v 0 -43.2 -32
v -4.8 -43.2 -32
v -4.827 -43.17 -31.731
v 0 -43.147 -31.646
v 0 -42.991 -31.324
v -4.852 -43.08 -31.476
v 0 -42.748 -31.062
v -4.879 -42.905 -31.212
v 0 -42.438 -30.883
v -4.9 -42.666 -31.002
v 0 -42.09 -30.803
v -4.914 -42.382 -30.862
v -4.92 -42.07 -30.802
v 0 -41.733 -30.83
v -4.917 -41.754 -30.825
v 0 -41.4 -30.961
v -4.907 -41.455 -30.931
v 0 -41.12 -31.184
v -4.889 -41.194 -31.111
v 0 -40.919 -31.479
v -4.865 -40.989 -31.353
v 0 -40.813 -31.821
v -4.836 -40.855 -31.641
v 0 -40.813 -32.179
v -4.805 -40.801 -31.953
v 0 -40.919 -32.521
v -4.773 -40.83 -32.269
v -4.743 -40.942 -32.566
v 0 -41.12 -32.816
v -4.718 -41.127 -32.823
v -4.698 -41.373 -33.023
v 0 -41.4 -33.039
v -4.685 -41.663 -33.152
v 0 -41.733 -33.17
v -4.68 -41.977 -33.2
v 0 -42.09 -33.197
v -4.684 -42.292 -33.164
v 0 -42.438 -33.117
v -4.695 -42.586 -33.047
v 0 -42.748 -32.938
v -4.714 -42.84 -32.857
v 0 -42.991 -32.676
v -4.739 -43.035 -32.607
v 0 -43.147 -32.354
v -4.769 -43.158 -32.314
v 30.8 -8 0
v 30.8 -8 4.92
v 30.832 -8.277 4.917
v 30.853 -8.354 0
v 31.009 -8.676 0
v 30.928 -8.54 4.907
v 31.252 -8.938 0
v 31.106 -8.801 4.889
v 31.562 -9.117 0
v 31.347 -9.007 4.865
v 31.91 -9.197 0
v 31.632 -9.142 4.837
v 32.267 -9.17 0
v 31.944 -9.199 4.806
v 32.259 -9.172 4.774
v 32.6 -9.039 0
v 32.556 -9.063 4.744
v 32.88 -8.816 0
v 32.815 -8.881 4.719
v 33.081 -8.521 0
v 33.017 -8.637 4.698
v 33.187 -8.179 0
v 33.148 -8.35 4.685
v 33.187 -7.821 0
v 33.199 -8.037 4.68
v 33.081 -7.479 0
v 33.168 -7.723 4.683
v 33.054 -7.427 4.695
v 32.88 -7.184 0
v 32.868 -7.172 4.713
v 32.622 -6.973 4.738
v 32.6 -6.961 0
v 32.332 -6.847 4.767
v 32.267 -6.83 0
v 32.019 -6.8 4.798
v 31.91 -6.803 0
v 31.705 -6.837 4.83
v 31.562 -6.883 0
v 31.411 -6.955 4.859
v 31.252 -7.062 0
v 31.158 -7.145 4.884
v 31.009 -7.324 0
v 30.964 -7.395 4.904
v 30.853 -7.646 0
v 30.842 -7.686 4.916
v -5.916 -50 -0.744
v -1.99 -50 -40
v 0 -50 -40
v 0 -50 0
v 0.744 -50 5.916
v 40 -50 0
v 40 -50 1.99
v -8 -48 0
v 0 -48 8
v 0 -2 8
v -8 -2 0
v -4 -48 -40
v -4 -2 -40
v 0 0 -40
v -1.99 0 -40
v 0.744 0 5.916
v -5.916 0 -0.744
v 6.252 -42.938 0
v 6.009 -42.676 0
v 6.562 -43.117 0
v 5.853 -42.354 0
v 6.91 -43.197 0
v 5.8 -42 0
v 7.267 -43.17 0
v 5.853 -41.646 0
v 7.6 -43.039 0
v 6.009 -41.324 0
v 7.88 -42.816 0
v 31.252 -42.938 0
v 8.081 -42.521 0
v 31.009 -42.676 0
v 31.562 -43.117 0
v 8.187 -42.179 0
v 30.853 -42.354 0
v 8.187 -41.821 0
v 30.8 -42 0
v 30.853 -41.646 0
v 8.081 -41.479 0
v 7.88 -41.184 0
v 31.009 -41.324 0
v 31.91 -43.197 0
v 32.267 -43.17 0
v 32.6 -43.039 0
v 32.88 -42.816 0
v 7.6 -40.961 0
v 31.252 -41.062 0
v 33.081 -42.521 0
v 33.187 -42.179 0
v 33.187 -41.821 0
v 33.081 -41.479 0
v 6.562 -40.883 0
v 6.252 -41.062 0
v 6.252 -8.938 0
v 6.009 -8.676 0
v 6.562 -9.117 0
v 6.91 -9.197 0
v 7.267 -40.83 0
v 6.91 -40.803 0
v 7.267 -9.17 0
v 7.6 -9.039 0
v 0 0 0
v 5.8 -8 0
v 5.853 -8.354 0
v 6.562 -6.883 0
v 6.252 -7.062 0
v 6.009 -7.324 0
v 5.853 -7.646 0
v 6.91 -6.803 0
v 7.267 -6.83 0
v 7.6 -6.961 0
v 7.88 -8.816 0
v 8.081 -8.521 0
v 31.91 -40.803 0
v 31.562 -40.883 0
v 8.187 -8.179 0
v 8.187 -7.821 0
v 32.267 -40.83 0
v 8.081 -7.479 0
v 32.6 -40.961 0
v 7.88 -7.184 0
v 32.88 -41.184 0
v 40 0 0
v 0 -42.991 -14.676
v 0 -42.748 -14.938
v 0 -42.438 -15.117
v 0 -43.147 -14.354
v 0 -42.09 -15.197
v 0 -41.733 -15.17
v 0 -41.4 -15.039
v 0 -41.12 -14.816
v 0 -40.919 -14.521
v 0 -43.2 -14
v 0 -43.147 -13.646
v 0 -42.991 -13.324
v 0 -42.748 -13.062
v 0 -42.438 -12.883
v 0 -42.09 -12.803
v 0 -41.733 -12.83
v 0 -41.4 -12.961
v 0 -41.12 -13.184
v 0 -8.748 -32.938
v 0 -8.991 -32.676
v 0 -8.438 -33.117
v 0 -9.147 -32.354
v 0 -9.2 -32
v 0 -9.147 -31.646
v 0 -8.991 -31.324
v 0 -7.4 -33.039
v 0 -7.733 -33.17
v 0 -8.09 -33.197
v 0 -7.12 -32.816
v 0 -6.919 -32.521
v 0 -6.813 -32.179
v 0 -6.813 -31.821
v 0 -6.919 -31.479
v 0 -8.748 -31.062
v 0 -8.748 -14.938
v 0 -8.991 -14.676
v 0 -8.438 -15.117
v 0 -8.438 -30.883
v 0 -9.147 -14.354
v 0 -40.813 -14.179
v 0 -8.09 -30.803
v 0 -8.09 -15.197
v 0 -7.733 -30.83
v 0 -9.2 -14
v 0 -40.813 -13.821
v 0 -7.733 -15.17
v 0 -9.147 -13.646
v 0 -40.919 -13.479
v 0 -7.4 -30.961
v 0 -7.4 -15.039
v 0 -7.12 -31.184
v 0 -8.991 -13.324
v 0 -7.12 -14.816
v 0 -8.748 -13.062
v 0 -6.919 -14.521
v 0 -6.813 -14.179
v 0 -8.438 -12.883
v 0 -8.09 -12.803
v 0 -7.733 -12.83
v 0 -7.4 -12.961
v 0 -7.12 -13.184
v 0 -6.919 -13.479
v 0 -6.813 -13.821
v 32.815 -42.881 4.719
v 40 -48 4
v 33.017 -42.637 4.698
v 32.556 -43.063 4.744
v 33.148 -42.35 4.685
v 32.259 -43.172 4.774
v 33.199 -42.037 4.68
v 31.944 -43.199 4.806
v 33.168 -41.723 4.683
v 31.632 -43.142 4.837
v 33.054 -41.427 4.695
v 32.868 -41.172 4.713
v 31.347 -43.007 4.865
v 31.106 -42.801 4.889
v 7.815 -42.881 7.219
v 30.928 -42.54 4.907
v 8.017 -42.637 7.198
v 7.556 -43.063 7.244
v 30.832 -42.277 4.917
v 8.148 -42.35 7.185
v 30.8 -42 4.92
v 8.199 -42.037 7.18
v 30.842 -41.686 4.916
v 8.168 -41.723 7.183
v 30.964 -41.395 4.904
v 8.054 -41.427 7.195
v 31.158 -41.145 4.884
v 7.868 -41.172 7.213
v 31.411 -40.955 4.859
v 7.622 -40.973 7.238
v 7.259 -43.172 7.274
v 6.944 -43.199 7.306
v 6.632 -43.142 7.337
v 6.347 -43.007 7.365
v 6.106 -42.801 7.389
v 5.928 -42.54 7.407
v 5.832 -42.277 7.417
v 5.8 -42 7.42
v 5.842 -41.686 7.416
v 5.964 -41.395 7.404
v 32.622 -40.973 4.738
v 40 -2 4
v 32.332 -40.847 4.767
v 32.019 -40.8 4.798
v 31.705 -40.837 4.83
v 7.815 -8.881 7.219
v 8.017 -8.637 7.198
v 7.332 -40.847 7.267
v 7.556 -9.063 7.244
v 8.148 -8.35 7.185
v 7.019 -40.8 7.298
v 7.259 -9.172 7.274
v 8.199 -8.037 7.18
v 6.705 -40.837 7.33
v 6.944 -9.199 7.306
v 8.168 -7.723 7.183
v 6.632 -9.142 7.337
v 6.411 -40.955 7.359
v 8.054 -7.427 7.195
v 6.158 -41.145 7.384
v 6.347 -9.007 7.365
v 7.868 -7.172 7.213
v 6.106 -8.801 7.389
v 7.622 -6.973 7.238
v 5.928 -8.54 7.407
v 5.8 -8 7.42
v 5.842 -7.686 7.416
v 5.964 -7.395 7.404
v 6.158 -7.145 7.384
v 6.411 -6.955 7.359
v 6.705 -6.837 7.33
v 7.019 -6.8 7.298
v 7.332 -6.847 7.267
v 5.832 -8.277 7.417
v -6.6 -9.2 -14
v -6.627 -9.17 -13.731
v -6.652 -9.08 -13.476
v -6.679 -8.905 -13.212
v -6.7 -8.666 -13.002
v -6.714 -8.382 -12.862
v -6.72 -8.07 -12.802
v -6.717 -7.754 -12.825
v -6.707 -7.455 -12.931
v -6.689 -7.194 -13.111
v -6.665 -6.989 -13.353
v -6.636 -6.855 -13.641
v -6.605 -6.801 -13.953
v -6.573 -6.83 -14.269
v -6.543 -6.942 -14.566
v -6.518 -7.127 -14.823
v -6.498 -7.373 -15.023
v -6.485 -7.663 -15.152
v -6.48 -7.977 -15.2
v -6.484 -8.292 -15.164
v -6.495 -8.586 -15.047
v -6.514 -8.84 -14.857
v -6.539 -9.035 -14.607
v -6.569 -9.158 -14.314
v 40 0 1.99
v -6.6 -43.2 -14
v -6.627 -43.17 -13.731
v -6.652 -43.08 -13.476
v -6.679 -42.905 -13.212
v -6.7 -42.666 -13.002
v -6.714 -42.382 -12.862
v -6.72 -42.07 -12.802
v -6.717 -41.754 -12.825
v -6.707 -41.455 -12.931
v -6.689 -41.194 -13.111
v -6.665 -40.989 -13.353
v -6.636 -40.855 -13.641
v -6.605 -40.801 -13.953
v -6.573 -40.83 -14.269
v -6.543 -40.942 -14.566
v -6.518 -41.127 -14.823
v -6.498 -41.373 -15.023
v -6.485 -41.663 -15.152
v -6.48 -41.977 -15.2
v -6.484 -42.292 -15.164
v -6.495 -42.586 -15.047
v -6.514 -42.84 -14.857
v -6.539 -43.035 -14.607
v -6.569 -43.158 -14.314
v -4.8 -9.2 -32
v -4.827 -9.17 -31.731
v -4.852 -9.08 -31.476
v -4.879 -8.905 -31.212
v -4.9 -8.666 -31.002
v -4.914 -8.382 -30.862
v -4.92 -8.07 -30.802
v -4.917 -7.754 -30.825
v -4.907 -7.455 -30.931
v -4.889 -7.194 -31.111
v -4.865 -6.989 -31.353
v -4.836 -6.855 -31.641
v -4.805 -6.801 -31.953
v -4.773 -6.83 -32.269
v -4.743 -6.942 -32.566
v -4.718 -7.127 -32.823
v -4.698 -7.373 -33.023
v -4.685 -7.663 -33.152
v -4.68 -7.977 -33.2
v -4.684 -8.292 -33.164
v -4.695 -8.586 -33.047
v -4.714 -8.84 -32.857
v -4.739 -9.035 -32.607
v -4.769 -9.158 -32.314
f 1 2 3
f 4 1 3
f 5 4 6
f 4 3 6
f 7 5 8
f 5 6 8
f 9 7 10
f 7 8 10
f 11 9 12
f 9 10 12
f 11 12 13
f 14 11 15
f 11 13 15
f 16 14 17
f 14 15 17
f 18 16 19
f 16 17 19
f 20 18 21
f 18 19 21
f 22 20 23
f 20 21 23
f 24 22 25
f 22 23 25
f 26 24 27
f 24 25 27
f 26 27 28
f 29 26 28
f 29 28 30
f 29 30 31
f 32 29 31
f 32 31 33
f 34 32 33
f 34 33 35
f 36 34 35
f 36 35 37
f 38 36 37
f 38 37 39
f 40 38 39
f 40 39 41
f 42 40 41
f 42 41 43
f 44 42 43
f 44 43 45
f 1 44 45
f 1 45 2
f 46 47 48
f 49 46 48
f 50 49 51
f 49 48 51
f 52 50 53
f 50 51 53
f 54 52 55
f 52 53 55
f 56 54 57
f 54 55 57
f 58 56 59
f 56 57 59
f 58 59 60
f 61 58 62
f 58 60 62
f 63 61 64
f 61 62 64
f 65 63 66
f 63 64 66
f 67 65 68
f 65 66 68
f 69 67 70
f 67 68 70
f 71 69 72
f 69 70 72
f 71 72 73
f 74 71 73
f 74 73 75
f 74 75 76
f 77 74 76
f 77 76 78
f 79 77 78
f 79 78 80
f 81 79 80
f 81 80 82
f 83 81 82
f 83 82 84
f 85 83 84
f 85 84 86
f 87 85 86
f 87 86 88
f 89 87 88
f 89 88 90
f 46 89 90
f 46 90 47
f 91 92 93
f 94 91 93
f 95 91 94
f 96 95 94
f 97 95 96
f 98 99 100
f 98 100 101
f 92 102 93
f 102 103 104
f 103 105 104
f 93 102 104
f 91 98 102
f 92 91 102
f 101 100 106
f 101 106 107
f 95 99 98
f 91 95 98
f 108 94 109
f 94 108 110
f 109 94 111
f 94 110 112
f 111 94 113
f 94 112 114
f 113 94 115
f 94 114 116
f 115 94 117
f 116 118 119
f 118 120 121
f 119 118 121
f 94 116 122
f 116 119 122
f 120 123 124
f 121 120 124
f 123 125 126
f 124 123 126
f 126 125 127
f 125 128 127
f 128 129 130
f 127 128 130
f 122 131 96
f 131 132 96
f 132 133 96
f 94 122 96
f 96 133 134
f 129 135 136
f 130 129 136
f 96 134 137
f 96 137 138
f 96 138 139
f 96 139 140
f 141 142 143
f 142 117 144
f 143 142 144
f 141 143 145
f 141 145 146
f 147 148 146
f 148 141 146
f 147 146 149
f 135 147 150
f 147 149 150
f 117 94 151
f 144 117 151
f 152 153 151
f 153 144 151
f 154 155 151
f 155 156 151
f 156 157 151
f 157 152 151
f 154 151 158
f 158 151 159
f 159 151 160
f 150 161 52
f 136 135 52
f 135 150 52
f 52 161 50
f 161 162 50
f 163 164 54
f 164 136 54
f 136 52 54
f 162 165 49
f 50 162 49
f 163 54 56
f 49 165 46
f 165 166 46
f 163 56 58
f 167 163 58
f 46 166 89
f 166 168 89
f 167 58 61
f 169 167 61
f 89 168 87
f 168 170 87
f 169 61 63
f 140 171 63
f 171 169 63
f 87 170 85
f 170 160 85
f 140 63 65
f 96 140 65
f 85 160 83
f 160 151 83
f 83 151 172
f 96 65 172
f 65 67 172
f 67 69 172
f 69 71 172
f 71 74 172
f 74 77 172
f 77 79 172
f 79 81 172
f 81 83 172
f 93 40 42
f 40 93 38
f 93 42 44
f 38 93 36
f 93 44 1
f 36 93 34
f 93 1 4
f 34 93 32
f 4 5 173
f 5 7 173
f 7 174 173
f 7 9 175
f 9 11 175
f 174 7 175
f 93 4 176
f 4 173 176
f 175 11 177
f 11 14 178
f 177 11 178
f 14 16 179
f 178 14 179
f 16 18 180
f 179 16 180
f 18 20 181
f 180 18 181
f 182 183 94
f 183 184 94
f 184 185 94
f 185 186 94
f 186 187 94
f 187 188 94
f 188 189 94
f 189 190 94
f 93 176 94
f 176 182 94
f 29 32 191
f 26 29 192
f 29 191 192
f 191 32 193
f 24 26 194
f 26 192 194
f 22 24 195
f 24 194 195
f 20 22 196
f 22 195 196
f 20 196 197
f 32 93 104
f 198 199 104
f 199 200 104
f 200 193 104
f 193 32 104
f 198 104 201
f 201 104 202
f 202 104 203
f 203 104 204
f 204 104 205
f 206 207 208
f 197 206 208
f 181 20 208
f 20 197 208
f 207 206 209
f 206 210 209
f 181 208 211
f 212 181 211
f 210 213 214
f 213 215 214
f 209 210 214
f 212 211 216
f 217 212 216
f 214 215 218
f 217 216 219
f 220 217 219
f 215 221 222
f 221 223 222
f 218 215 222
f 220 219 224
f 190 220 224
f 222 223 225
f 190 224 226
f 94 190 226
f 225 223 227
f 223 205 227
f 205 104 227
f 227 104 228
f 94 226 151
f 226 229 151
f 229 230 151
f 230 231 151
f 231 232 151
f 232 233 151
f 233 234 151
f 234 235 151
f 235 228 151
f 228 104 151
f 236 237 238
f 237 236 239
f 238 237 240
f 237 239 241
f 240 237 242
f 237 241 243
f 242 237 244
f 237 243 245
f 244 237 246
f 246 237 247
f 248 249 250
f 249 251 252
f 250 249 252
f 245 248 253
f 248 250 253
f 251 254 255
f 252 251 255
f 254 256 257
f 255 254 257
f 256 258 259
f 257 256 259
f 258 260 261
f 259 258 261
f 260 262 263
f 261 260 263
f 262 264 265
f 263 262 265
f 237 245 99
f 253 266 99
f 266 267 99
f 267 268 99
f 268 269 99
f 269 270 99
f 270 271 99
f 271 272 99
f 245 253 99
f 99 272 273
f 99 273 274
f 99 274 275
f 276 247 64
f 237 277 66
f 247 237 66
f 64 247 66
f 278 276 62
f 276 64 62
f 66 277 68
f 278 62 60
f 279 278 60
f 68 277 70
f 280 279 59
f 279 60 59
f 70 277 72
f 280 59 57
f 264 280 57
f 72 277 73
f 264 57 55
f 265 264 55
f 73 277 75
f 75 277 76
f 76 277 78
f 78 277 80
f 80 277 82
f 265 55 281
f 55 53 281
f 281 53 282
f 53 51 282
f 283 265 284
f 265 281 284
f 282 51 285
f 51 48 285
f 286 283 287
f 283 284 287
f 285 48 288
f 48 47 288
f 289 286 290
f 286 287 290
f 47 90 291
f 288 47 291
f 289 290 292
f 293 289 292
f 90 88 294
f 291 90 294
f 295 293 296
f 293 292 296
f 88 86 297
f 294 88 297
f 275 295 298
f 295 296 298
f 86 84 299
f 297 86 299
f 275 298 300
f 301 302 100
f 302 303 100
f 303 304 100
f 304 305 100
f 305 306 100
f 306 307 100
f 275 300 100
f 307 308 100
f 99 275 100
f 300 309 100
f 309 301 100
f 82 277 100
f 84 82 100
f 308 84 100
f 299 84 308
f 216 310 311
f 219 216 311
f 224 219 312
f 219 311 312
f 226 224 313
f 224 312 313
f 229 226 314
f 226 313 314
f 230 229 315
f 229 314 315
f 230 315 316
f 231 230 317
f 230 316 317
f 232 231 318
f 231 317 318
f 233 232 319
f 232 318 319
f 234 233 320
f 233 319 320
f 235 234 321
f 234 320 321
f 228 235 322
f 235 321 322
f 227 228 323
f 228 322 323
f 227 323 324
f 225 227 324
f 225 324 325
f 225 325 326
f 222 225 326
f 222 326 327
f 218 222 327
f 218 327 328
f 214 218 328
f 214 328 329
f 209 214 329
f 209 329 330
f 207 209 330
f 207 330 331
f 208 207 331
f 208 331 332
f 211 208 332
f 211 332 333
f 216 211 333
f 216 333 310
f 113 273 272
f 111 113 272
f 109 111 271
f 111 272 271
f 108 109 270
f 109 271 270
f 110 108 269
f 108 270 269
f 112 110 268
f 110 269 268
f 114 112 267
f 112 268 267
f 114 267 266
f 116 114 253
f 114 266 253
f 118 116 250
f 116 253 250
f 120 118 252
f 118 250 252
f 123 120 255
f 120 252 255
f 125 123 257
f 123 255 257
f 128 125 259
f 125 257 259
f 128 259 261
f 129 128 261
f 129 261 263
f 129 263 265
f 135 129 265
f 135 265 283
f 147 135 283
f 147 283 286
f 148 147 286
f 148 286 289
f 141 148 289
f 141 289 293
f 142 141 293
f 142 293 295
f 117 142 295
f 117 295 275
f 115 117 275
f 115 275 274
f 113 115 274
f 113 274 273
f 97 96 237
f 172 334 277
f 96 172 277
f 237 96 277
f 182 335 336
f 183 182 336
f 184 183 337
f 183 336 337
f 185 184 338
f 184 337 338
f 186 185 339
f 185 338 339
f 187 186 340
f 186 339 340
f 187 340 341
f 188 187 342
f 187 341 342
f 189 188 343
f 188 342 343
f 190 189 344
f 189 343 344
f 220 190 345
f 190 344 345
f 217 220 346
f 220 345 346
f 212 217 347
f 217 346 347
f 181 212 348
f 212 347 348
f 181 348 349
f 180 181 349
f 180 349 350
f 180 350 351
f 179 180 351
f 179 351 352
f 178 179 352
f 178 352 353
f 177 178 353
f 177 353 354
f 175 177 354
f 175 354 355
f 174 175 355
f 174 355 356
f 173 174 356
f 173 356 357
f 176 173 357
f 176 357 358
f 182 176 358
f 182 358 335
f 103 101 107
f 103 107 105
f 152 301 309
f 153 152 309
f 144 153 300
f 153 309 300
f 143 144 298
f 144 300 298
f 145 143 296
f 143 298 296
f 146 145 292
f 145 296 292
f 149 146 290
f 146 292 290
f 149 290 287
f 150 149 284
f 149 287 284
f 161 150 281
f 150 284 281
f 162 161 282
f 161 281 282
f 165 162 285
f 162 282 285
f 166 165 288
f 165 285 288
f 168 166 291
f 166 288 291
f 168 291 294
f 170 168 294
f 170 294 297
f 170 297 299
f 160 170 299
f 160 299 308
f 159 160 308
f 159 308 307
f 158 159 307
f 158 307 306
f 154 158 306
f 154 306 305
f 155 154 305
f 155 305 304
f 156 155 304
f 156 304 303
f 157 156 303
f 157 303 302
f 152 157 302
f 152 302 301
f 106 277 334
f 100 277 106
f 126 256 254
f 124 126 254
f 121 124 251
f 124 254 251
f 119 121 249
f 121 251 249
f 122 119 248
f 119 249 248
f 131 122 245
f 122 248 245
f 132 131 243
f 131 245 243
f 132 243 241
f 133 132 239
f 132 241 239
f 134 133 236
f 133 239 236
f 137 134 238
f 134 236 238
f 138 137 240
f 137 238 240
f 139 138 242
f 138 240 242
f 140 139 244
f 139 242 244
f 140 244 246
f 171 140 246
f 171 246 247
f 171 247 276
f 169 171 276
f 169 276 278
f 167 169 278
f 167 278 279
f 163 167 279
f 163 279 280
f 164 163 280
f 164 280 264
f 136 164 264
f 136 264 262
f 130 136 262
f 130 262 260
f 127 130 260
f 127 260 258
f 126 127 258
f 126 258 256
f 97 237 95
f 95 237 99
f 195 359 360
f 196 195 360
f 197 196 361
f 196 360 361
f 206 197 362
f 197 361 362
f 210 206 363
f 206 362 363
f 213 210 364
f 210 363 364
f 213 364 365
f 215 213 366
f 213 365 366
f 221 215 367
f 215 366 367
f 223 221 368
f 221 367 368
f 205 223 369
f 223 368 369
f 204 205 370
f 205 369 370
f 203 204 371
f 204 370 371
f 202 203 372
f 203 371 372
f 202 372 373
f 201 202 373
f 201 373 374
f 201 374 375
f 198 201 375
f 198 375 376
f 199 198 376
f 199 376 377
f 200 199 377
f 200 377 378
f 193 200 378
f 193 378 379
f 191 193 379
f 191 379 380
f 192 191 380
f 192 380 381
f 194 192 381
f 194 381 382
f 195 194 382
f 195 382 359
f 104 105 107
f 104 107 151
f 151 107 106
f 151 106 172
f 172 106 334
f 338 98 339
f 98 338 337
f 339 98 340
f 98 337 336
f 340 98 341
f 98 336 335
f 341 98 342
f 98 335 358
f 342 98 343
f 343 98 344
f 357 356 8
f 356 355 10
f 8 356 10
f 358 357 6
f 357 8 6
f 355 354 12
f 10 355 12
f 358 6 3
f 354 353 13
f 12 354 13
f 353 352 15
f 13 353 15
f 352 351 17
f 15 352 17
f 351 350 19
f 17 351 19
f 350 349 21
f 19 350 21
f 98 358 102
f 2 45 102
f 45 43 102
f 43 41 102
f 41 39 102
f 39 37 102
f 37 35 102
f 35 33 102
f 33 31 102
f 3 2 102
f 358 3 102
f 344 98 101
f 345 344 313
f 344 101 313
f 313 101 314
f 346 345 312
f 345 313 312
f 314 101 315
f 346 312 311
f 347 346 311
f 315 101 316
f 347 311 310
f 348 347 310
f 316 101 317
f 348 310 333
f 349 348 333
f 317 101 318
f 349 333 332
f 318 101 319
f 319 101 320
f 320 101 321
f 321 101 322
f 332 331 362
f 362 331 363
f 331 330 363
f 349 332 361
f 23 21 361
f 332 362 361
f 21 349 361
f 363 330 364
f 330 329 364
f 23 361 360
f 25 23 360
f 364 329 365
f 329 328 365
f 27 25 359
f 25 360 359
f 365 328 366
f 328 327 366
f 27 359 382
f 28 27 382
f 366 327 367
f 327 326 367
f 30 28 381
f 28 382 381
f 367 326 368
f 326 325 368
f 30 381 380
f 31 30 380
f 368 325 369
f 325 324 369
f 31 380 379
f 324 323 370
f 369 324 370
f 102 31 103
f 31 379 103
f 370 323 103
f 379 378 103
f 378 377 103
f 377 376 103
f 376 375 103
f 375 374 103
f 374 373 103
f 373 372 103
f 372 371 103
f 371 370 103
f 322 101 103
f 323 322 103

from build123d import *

# Parameters (mm, degrees)
F1_DEPTH = 50
F3_D     = 2.4
F5_D     = 2.4
F6_SIZE  = 2


with BuildPart() as f1:
    # F0 (on Front) → F1 (new body)
    with BuildSketch(Plane.XZ):
        Polygon((0, -40), (0, 0), (40, 0), (40, 4), (0, 8), (-8, 0), (-4, -40), align=None)
    extrude(amount=F1_DEPTH)

    # F3 (through all)
    with Locations(Plane(origin=(0, 0, 0), x_dir=(1, 0, 0), z_dir=(0, 0, -1))):
        with Locations((32, 42), (32, 8), (7, 8), (7, 42)):
            Hole(F3_D / 2)

    # F5 (through all)
    with Locations(Plane.YZ):
        with Locations((-42, -32), (-42, -14), (-8, -32), (-8, -14)):
            Hole(F5_D / 2)

    # F6
    f6_edges = [f1.edges().sort_by_distance(p)[0] for p in [
        (20, -50, 6),
        (-4, -50, 4),
        (-6, -50, -20),
        (-6, 0, -20),
        (20, 0, 6),
        (-4, 0, 4),
    ]]
    chamfer(f6_edges, length=F6_SIZE)


solid = f1.part
